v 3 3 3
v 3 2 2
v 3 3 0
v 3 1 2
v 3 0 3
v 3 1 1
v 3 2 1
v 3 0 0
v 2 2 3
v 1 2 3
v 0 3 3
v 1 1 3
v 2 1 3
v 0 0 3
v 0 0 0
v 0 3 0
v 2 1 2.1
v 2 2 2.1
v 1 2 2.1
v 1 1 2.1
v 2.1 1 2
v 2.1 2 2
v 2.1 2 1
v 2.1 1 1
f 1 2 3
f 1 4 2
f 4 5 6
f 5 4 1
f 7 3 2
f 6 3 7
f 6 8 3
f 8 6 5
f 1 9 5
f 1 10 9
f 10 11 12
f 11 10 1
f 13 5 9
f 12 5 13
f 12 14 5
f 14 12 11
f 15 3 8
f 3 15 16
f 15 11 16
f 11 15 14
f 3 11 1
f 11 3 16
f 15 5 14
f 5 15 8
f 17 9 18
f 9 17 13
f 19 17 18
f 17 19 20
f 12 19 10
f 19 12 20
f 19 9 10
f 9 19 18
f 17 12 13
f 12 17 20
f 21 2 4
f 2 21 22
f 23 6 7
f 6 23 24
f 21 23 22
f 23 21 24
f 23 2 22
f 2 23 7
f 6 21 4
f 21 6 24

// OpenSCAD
// file: female.scad
difference() {
    cube(3);
    translate([1, 1, 2.1]) {
        cube([1, 1, 1]);
    }
}
// main file
difference() {
    include <female.scad>
    translate([2.1, 1, 1]) {
        cube([1, 1, 1]);
    }
}
